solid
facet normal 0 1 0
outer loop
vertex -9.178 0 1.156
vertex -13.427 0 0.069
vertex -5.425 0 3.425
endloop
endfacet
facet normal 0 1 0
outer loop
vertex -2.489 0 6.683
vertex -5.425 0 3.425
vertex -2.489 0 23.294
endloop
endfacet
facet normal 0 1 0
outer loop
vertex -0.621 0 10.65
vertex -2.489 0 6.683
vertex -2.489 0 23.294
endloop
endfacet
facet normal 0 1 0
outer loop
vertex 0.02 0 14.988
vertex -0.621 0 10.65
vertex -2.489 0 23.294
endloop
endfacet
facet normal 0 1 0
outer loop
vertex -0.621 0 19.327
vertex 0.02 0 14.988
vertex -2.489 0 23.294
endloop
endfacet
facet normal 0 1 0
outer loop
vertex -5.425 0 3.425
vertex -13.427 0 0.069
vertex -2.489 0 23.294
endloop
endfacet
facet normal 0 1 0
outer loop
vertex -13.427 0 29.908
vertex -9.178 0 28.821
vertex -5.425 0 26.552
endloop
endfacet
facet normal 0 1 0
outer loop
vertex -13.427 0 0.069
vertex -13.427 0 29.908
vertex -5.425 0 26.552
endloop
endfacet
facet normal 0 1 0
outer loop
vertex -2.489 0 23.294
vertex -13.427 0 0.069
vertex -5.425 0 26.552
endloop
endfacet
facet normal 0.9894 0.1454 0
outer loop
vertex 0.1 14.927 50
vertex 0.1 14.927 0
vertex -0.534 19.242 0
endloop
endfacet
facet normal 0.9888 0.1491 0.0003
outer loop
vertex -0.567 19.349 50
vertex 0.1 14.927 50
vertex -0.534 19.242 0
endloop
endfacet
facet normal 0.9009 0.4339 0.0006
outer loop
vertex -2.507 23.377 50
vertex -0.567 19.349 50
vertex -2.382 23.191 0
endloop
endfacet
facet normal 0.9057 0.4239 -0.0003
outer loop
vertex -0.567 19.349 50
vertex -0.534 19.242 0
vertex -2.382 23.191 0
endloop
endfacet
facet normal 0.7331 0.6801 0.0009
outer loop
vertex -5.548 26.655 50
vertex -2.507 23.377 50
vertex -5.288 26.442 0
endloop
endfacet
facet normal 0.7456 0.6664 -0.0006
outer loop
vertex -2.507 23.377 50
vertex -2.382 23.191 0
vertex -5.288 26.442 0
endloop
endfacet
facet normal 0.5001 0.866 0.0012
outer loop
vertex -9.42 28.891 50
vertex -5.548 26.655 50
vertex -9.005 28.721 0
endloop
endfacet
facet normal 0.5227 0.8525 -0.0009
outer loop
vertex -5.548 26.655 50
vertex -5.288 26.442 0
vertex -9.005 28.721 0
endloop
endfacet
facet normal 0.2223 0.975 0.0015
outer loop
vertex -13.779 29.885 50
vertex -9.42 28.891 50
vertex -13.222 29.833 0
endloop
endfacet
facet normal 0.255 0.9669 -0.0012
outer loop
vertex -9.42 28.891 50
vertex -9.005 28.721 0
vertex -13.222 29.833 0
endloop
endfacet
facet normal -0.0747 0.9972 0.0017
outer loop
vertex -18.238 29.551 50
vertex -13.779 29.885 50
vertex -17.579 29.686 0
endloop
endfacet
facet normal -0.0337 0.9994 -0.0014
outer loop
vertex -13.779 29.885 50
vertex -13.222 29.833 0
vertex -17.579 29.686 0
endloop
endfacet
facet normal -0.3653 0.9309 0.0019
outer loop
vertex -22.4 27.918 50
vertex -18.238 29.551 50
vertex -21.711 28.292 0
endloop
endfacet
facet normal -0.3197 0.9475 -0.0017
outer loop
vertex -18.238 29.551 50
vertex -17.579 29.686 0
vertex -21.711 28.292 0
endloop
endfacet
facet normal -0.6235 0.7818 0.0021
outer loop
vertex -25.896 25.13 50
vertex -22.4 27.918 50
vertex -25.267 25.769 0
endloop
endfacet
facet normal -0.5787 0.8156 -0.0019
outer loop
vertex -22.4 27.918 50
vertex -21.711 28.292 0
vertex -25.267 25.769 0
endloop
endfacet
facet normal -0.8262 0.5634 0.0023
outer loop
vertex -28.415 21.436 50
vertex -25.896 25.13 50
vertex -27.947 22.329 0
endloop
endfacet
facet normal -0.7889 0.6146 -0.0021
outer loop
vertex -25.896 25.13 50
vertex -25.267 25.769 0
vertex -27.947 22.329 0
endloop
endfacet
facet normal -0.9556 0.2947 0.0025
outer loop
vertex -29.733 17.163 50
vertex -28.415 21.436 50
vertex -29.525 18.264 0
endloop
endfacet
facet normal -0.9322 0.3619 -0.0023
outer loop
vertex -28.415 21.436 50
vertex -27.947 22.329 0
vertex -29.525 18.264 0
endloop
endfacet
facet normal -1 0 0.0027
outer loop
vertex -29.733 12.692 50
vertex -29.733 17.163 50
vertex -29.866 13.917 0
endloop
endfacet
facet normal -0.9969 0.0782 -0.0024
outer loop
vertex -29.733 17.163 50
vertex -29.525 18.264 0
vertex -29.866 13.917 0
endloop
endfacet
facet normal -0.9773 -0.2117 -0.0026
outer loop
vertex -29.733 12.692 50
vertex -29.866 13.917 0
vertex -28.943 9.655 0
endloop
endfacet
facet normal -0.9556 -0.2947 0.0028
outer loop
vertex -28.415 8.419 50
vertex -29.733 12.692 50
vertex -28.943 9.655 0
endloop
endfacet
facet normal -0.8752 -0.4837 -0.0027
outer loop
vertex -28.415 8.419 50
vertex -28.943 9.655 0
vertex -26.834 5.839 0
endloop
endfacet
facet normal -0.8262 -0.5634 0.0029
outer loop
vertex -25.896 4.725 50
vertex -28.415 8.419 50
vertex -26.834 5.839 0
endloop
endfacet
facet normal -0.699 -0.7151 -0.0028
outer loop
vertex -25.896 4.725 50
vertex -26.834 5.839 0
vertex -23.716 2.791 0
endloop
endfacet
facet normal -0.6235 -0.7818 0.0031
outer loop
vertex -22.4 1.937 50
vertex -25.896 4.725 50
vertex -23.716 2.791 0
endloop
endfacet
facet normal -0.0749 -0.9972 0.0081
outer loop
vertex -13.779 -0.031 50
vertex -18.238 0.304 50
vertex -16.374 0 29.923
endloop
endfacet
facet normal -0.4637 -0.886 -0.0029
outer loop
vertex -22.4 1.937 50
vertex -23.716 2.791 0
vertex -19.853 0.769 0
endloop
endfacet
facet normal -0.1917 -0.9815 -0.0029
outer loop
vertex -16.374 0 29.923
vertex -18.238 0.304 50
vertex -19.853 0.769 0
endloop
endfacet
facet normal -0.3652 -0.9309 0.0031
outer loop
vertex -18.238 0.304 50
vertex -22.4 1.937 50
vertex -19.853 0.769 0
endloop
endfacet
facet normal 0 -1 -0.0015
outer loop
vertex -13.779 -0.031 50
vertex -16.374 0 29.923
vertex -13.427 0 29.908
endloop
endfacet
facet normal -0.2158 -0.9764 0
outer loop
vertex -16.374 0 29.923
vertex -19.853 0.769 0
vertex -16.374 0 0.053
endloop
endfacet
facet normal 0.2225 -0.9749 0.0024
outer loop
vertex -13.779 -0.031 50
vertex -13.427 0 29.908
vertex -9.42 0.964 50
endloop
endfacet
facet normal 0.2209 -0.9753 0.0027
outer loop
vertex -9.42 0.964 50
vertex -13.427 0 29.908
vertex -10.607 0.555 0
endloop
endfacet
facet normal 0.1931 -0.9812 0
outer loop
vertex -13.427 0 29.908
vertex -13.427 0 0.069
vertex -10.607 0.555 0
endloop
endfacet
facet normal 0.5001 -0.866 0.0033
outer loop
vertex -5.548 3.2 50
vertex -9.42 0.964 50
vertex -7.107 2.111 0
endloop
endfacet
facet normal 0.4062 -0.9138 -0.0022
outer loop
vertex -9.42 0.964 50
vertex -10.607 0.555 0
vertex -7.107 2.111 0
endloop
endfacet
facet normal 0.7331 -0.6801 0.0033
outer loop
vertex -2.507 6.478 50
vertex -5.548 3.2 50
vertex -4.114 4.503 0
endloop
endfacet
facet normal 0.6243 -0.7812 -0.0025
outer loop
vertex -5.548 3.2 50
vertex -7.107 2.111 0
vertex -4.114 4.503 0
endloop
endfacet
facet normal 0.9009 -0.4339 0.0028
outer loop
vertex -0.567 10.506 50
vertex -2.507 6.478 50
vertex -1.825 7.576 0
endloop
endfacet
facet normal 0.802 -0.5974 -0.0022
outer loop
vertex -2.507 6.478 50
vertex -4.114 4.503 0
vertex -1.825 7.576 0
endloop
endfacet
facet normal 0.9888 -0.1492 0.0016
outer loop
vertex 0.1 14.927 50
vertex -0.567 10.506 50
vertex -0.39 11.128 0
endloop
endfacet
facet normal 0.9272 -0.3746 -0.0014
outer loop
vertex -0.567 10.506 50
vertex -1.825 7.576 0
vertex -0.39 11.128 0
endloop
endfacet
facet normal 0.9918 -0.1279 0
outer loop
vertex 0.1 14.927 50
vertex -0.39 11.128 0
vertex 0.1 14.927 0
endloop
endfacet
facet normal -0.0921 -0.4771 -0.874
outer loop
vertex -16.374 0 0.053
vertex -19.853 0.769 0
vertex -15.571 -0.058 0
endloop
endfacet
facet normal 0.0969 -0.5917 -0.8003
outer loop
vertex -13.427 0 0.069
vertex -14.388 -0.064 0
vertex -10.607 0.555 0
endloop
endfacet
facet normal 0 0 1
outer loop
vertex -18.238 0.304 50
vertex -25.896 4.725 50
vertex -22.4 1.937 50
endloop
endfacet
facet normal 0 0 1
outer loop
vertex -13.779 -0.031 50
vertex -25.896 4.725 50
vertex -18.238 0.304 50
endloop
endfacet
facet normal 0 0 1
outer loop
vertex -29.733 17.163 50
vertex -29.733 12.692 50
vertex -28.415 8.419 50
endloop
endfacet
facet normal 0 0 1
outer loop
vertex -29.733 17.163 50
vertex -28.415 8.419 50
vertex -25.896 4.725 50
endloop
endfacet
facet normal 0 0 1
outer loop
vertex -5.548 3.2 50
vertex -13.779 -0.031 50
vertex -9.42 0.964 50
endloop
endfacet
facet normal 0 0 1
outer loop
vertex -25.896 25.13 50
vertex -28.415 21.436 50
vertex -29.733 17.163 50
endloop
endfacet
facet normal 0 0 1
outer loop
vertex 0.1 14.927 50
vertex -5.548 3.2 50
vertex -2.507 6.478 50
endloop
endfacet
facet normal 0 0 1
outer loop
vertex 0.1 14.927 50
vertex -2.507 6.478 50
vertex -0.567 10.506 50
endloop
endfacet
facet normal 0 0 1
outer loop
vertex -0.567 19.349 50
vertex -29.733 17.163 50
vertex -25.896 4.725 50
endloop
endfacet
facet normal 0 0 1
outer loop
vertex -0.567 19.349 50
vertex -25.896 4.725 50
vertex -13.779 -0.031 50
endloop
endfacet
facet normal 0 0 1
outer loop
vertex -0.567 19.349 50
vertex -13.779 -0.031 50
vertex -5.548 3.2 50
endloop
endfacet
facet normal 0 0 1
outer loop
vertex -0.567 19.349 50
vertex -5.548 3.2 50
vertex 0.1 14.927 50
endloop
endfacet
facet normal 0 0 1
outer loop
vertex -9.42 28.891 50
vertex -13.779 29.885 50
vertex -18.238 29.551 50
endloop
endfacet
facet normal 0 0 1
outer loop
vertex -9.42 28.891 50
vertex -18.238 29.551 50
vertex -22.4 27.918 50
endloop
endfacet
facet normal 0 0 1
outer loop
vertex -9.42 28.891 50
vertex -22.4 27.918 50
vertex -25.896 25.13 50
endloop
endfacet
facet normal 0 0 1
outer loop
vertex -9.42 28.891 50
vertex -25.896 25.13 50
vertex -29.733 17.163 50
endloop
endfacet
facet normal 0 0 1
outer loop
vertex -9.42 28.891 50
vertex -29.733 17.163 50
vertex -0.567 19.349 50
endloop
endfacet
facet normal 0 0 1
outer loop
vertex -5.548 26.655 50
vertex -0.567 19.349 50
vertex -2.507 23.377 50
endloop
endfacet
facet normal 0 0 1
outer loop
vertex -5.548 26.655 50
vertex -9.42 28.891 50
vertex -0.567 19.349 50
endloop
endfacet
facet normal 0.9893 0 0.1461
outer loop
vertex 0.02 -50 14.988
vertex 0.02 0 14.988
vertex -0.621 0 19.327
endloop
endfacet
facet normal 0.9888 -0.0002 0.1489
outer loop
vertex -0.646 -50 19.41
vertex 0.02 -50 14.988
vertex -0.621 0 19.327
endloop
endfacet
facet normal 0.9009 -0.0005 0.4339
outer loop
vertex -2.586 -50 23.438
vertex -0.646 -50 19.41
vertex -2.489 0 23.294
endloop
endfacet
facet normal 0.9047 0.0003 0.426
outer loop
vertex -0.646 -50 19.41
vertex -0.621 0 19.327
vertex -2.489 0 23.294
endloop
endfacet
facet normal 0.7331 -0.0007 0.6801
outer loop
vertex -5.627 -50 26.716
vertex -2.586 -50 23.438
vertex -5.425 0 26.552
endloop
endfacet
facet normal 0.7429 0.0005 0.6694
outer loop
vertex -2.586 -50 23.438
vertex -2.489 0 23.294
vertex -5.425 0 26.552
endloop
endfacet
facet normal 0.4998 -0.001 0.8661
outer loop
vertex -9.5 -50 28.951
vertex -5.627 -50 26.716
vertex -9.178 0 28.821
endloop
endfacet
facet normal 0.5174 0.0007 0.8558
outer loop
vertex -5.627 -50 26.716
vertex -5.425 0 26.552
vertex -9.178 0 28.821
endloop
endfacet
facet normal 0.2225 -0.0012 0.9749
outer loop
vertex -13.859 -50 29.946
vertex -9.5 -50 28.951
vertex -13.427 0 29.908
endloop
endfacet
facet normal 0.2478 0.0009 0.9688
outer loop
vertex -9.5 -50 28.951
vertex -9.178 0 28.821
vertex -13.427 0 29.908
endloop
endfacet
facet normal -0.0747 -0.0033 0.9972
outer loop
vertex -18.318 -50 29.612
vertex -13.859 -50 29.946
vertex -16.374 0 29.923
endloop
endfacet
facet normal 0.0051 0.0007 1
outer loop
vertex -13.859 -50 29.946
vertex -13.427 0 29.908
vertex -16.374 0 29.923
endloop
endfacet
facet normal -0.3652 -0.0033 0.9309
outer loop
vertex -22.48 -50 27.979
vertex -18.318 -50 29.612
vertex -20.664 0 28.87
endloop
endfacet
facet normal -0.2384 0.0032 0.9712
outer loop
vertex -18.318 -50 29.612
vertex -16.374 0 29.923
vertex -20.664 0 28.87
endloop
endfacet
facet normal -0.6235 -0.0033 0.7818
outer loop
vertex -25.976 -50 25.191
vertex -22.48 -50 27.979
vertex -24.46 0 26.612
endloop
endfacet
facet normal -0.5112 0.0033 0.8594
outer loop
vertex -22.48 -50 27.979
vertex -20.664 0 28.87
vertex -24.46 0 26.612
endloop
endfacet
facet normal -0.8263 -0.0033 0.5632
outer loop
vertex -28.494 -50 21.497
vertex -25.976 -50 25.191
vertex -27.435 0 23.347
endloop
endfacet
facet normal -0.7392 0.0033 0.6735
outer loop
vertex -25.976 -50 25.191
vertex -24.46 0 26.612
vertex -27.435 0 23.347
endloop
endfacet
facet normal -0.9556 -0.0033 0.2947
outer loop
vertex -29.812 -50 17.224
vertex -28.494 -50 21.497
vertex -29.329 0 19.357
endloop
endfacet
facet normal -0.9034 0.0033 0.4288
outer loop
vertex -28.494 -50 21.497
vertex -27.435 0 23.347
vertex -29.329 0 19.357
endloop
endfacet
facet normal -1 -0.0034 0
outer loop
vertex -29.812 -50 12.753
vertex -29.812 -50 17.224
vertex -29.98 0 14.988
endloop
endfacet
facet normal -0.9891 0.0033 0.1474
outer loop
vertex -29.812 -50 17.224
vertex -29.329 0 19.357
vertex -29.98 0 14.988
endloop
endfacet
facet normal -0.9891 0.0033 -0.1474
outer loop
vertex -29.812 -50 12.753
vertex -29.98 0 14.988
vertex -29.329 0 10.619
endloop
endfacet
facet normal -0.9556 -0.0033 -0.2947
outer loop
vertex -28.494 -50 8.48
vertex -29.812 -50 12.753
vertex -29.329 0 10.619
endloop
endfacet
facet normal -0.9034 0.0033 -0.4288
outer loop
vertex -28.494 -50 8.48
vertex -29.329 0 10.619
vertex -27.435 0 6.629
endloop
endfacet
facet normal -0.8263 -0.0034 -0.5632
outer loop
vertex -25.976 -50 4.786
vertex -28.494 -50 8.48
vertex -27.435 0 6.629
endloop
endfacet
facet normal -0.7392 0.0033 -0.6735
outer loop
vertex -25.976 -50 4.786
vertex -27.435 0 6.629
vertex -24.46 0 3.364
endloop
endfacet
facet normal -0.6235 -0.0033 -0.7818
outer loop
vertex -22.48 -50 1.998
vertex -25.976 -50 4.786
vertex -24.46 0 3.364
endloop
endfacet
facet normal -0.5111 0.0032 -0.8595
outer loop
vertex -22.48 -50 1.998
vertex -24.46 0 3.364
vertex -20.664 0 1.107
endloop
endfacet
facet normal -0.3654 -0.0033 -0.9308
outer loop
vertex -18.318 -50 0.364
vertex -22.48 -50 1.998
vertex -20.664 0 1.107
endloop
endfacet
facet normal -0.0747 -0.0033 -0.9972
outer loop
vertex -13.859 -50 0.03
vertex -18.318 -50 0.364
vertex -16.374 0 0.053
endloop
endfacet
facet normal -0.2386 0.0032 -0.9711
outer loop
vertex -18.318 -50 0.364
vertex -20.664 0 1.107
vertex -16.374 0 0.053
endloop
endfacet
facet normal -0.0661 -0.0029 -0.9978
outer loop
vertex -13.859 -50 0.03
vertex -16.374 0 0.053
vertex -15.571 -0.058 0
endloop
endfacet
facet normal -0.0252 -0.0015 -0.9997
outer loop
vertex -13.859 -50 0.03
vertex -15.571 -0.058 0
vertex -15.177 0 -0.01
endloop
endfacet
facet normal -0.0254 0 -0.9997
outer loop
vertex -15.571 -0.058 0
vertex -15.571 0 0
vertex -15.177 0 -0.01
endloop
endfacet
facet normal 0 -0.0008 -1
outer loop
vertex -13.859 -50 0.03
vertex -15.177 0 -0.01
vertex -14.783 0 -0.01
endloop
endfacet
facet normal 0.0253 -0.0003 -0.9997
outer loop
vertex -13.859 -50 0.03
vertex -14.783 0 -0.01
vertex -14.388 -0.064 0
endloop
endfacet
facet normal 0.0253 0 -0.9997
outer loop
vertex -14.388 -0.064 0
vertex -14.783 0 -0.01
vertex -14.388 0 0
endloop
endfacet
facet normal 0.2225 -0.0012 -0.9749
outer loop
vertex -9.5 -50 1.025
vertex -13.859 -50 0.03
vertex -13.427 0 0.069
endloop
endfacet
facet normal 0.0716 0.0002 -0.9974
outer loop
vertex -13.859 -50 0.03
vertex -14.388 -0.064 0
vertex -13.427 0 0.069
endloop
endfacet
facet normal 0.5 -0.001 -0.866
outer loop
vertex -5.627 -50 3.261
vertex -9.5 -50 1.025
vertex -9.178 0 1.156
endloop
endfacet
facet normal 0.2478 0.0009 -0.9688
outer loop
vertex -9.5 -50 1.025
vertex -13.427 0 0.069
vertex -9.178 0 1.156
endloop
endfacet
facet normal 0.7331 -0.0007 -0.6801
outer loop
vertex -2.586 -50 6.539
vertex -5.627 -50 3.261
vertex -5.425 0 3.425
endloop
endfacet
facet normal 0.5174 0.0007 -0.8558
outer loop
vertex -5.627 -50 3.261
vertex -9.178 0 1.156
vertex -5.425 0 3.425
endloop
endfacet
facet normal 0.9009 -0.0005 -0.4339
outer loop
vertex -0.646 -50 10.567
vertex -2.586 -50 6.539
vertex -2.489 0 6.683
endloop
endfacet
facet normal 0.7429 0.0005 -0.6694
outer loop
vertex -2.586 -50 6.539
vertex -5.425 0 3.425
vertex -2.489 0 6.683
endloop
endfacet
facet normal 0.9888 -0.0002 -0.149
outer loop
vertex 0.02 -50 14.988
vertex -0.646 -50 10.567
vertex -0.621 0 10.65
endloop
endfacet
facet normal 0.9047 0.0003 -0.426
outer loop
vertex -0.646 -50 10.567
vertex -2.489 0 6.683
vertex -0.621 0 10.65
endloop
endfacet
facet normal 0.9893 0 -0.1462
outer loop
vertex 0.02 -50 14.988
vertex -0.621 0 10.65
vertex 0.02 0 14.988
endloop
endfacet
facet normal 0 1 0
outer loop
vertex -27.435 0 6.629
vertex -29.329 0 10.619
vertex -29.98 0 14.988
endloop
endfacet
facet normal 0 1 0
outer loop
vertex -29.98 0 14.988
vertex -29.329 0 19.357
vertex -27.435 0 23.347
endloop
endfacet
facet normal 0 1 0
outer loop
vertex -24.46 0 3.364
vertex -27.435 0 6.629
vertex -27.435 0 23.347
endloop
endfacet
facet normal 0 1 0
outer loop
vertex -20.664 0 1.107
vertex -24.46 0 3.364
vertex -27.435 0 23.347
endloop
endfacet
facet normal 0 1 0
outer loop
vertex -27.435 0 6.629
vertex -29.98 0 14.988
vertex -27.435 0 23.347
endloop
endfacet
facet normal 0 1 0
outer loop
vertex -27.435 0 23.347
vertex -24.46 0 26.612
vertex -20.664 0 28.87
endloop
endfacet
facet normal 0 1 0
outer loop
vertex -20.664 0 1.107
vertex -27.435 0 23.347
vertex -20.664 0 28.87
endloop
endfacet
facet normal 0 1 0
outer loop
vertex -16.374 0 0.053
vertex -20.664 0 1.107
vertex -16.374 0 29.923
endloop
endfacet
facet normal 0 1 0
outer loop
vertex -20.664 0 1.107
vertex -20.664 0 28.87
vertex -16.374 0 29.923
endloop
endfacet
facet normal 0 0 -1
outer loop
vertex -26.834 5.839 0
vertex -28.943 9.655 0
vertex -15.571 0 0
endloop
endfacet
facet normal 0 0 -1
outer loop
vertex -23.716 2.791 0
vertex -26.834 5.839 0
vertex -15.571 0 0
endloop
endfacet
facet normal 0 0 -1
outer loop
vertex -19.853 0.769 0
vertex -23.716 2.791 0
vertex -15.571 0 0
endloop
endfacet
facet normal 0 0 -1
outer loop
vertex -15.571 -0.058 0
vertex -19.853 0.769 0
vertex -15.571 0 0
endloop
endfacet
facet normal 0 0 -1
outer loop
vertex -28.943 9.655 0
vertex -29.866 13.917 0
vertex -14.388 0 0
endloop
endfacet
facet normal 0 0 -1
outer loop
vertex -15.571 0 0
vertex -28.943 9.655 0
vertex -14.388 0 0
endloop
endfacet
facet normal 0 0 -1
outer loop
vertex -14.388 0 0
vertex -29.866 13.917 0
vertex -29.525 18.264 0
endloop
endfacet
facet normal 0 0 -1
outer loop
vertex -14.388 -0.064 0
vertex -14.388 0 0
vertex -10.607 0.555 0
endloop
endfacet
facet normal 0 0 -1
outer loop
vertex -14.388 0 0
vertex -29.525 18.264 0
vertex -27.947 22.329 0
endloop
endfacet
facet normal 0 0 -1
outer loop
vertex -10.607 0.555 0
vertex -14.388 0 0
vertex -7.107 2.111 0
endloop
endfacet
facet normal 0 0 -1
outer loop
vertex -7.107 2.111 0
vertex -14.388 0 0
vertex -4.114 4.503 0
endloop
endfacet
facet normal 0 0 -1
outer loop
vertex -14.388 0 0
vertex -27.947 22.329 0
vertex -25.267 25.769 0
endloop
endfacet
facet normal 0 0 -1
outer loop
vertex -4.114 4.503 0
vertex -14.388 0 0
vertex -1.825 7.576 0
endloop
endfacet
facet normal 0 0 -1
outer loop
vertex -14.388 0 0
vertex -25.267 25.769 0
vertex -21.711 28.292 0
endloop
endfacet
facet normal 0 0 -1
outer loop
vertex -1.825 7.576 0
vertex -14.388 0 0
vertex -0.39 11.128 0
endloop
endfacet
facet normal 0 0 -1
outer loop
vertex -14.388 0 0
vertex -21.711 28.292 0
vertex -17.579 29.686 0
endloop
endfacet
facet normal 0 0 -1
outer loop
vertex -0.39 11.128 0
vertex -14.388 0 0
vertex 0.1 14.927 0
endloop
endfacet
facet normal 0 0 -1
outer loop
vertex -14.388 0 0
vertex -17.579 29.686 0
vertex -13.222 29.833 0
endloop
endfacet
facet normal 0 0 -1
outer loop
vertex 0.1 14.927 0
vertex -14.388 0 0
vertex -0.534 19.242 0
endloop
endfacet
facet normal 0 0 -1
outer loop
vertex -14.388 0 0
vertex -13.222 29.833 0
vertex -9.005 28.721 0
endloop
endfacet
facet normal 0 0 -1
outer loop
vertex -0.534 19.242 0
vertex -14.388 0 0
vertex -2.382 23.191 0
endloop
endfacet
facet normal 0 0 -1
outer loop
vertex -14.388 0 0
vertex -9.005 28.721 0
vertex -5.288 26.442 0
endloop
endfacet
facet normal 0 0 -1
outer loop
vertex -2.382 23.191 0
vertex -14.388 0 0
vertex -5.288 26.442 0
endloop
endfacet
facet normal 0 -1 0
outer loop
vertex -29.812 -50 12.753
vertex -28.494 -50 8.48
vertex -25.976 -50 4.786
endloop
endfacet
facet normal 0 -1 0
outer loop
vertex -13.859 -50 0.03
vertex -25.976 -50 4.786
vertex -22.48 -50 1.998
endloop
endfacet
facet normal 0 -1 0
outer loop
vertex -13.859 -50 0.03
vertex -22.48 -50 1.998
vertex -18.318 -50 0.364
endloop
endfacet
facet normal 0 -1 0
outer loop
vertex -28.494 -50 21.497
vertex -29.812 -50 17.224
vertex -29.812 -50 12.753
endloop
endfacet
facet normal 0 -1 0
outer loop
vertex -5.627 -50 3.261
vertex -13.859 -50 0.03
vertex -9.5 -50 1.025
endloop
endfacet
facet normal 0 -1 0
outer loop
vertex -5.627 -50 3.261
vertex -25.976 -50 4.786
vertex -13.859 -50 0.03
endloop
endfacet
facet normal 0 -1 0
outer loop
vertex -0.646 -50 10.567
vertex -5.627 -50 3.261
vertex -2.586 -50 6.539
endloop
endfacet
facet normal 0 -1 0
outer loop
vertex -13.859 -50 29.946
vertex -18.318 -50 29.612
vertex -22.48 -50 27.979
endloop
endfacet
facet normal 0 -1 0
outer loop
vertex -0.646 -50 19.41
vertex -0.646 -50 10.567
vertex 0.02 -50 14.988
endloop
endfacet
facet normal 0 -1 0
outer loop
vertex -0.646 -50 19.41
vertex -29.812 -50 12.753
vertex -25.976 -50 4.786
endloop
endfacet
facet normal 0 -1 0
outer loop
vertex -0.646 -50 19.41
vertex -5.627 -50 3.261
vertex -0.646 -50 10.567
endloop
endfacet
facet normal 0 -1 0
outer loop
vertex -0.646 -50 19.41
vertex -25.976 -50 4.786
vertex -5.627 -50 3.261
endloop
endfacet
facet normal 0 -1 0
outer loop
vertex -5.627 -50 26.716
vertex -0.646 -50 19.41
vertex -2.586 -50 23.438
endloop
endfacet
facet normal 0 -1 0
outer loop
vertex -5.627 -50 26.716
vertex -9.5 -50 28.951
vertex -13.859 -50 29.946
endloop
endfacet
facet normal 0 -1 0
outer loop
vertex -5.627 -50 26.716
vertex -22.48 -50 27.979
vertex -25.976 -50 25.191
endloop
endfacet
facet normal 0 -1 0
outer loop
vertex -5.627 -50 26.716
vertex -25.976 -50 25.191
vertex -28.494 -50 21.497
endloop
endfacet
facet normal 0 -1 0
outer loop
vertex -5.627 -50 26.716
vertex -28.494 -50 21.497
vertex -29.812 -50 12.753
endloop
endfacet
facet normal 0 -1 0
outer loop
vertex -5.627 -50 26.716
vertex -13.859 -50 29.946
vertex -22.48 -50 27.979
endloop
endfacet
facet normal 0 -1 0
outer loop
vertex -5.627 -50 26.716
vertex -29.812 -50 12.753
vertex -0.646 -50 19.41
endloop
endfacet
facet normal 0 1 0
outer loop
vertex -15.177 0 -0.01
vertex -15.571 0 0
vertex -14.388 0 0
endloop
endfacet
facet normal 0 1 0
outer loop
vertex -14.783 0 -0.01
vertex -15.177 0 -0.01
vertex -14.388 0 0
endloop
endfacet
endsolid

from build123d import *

# Parameters (mm, degrees)
F0_R     = 15
F1_DEPTH = 50
F2_R     = 15
F3_DEPTH = 50


with BuildPart() as f1:
    # F0 (on Front) → F1 (new body)
    with BuildSketch(Plane.XZ):
        with Locations((-14.979829, 14.988333)):
            Circle(F0_R)
    extrude(amount=F1_DEPTH)

    # F2 (on Top) → F3 (join)
    with BuildSketch(Plane.XY):
        with Locations((-14.900394, 14.927425)):
            Circle(F2_R)
    extrude(amount=F3_DEPTH)


solid = f1.part
